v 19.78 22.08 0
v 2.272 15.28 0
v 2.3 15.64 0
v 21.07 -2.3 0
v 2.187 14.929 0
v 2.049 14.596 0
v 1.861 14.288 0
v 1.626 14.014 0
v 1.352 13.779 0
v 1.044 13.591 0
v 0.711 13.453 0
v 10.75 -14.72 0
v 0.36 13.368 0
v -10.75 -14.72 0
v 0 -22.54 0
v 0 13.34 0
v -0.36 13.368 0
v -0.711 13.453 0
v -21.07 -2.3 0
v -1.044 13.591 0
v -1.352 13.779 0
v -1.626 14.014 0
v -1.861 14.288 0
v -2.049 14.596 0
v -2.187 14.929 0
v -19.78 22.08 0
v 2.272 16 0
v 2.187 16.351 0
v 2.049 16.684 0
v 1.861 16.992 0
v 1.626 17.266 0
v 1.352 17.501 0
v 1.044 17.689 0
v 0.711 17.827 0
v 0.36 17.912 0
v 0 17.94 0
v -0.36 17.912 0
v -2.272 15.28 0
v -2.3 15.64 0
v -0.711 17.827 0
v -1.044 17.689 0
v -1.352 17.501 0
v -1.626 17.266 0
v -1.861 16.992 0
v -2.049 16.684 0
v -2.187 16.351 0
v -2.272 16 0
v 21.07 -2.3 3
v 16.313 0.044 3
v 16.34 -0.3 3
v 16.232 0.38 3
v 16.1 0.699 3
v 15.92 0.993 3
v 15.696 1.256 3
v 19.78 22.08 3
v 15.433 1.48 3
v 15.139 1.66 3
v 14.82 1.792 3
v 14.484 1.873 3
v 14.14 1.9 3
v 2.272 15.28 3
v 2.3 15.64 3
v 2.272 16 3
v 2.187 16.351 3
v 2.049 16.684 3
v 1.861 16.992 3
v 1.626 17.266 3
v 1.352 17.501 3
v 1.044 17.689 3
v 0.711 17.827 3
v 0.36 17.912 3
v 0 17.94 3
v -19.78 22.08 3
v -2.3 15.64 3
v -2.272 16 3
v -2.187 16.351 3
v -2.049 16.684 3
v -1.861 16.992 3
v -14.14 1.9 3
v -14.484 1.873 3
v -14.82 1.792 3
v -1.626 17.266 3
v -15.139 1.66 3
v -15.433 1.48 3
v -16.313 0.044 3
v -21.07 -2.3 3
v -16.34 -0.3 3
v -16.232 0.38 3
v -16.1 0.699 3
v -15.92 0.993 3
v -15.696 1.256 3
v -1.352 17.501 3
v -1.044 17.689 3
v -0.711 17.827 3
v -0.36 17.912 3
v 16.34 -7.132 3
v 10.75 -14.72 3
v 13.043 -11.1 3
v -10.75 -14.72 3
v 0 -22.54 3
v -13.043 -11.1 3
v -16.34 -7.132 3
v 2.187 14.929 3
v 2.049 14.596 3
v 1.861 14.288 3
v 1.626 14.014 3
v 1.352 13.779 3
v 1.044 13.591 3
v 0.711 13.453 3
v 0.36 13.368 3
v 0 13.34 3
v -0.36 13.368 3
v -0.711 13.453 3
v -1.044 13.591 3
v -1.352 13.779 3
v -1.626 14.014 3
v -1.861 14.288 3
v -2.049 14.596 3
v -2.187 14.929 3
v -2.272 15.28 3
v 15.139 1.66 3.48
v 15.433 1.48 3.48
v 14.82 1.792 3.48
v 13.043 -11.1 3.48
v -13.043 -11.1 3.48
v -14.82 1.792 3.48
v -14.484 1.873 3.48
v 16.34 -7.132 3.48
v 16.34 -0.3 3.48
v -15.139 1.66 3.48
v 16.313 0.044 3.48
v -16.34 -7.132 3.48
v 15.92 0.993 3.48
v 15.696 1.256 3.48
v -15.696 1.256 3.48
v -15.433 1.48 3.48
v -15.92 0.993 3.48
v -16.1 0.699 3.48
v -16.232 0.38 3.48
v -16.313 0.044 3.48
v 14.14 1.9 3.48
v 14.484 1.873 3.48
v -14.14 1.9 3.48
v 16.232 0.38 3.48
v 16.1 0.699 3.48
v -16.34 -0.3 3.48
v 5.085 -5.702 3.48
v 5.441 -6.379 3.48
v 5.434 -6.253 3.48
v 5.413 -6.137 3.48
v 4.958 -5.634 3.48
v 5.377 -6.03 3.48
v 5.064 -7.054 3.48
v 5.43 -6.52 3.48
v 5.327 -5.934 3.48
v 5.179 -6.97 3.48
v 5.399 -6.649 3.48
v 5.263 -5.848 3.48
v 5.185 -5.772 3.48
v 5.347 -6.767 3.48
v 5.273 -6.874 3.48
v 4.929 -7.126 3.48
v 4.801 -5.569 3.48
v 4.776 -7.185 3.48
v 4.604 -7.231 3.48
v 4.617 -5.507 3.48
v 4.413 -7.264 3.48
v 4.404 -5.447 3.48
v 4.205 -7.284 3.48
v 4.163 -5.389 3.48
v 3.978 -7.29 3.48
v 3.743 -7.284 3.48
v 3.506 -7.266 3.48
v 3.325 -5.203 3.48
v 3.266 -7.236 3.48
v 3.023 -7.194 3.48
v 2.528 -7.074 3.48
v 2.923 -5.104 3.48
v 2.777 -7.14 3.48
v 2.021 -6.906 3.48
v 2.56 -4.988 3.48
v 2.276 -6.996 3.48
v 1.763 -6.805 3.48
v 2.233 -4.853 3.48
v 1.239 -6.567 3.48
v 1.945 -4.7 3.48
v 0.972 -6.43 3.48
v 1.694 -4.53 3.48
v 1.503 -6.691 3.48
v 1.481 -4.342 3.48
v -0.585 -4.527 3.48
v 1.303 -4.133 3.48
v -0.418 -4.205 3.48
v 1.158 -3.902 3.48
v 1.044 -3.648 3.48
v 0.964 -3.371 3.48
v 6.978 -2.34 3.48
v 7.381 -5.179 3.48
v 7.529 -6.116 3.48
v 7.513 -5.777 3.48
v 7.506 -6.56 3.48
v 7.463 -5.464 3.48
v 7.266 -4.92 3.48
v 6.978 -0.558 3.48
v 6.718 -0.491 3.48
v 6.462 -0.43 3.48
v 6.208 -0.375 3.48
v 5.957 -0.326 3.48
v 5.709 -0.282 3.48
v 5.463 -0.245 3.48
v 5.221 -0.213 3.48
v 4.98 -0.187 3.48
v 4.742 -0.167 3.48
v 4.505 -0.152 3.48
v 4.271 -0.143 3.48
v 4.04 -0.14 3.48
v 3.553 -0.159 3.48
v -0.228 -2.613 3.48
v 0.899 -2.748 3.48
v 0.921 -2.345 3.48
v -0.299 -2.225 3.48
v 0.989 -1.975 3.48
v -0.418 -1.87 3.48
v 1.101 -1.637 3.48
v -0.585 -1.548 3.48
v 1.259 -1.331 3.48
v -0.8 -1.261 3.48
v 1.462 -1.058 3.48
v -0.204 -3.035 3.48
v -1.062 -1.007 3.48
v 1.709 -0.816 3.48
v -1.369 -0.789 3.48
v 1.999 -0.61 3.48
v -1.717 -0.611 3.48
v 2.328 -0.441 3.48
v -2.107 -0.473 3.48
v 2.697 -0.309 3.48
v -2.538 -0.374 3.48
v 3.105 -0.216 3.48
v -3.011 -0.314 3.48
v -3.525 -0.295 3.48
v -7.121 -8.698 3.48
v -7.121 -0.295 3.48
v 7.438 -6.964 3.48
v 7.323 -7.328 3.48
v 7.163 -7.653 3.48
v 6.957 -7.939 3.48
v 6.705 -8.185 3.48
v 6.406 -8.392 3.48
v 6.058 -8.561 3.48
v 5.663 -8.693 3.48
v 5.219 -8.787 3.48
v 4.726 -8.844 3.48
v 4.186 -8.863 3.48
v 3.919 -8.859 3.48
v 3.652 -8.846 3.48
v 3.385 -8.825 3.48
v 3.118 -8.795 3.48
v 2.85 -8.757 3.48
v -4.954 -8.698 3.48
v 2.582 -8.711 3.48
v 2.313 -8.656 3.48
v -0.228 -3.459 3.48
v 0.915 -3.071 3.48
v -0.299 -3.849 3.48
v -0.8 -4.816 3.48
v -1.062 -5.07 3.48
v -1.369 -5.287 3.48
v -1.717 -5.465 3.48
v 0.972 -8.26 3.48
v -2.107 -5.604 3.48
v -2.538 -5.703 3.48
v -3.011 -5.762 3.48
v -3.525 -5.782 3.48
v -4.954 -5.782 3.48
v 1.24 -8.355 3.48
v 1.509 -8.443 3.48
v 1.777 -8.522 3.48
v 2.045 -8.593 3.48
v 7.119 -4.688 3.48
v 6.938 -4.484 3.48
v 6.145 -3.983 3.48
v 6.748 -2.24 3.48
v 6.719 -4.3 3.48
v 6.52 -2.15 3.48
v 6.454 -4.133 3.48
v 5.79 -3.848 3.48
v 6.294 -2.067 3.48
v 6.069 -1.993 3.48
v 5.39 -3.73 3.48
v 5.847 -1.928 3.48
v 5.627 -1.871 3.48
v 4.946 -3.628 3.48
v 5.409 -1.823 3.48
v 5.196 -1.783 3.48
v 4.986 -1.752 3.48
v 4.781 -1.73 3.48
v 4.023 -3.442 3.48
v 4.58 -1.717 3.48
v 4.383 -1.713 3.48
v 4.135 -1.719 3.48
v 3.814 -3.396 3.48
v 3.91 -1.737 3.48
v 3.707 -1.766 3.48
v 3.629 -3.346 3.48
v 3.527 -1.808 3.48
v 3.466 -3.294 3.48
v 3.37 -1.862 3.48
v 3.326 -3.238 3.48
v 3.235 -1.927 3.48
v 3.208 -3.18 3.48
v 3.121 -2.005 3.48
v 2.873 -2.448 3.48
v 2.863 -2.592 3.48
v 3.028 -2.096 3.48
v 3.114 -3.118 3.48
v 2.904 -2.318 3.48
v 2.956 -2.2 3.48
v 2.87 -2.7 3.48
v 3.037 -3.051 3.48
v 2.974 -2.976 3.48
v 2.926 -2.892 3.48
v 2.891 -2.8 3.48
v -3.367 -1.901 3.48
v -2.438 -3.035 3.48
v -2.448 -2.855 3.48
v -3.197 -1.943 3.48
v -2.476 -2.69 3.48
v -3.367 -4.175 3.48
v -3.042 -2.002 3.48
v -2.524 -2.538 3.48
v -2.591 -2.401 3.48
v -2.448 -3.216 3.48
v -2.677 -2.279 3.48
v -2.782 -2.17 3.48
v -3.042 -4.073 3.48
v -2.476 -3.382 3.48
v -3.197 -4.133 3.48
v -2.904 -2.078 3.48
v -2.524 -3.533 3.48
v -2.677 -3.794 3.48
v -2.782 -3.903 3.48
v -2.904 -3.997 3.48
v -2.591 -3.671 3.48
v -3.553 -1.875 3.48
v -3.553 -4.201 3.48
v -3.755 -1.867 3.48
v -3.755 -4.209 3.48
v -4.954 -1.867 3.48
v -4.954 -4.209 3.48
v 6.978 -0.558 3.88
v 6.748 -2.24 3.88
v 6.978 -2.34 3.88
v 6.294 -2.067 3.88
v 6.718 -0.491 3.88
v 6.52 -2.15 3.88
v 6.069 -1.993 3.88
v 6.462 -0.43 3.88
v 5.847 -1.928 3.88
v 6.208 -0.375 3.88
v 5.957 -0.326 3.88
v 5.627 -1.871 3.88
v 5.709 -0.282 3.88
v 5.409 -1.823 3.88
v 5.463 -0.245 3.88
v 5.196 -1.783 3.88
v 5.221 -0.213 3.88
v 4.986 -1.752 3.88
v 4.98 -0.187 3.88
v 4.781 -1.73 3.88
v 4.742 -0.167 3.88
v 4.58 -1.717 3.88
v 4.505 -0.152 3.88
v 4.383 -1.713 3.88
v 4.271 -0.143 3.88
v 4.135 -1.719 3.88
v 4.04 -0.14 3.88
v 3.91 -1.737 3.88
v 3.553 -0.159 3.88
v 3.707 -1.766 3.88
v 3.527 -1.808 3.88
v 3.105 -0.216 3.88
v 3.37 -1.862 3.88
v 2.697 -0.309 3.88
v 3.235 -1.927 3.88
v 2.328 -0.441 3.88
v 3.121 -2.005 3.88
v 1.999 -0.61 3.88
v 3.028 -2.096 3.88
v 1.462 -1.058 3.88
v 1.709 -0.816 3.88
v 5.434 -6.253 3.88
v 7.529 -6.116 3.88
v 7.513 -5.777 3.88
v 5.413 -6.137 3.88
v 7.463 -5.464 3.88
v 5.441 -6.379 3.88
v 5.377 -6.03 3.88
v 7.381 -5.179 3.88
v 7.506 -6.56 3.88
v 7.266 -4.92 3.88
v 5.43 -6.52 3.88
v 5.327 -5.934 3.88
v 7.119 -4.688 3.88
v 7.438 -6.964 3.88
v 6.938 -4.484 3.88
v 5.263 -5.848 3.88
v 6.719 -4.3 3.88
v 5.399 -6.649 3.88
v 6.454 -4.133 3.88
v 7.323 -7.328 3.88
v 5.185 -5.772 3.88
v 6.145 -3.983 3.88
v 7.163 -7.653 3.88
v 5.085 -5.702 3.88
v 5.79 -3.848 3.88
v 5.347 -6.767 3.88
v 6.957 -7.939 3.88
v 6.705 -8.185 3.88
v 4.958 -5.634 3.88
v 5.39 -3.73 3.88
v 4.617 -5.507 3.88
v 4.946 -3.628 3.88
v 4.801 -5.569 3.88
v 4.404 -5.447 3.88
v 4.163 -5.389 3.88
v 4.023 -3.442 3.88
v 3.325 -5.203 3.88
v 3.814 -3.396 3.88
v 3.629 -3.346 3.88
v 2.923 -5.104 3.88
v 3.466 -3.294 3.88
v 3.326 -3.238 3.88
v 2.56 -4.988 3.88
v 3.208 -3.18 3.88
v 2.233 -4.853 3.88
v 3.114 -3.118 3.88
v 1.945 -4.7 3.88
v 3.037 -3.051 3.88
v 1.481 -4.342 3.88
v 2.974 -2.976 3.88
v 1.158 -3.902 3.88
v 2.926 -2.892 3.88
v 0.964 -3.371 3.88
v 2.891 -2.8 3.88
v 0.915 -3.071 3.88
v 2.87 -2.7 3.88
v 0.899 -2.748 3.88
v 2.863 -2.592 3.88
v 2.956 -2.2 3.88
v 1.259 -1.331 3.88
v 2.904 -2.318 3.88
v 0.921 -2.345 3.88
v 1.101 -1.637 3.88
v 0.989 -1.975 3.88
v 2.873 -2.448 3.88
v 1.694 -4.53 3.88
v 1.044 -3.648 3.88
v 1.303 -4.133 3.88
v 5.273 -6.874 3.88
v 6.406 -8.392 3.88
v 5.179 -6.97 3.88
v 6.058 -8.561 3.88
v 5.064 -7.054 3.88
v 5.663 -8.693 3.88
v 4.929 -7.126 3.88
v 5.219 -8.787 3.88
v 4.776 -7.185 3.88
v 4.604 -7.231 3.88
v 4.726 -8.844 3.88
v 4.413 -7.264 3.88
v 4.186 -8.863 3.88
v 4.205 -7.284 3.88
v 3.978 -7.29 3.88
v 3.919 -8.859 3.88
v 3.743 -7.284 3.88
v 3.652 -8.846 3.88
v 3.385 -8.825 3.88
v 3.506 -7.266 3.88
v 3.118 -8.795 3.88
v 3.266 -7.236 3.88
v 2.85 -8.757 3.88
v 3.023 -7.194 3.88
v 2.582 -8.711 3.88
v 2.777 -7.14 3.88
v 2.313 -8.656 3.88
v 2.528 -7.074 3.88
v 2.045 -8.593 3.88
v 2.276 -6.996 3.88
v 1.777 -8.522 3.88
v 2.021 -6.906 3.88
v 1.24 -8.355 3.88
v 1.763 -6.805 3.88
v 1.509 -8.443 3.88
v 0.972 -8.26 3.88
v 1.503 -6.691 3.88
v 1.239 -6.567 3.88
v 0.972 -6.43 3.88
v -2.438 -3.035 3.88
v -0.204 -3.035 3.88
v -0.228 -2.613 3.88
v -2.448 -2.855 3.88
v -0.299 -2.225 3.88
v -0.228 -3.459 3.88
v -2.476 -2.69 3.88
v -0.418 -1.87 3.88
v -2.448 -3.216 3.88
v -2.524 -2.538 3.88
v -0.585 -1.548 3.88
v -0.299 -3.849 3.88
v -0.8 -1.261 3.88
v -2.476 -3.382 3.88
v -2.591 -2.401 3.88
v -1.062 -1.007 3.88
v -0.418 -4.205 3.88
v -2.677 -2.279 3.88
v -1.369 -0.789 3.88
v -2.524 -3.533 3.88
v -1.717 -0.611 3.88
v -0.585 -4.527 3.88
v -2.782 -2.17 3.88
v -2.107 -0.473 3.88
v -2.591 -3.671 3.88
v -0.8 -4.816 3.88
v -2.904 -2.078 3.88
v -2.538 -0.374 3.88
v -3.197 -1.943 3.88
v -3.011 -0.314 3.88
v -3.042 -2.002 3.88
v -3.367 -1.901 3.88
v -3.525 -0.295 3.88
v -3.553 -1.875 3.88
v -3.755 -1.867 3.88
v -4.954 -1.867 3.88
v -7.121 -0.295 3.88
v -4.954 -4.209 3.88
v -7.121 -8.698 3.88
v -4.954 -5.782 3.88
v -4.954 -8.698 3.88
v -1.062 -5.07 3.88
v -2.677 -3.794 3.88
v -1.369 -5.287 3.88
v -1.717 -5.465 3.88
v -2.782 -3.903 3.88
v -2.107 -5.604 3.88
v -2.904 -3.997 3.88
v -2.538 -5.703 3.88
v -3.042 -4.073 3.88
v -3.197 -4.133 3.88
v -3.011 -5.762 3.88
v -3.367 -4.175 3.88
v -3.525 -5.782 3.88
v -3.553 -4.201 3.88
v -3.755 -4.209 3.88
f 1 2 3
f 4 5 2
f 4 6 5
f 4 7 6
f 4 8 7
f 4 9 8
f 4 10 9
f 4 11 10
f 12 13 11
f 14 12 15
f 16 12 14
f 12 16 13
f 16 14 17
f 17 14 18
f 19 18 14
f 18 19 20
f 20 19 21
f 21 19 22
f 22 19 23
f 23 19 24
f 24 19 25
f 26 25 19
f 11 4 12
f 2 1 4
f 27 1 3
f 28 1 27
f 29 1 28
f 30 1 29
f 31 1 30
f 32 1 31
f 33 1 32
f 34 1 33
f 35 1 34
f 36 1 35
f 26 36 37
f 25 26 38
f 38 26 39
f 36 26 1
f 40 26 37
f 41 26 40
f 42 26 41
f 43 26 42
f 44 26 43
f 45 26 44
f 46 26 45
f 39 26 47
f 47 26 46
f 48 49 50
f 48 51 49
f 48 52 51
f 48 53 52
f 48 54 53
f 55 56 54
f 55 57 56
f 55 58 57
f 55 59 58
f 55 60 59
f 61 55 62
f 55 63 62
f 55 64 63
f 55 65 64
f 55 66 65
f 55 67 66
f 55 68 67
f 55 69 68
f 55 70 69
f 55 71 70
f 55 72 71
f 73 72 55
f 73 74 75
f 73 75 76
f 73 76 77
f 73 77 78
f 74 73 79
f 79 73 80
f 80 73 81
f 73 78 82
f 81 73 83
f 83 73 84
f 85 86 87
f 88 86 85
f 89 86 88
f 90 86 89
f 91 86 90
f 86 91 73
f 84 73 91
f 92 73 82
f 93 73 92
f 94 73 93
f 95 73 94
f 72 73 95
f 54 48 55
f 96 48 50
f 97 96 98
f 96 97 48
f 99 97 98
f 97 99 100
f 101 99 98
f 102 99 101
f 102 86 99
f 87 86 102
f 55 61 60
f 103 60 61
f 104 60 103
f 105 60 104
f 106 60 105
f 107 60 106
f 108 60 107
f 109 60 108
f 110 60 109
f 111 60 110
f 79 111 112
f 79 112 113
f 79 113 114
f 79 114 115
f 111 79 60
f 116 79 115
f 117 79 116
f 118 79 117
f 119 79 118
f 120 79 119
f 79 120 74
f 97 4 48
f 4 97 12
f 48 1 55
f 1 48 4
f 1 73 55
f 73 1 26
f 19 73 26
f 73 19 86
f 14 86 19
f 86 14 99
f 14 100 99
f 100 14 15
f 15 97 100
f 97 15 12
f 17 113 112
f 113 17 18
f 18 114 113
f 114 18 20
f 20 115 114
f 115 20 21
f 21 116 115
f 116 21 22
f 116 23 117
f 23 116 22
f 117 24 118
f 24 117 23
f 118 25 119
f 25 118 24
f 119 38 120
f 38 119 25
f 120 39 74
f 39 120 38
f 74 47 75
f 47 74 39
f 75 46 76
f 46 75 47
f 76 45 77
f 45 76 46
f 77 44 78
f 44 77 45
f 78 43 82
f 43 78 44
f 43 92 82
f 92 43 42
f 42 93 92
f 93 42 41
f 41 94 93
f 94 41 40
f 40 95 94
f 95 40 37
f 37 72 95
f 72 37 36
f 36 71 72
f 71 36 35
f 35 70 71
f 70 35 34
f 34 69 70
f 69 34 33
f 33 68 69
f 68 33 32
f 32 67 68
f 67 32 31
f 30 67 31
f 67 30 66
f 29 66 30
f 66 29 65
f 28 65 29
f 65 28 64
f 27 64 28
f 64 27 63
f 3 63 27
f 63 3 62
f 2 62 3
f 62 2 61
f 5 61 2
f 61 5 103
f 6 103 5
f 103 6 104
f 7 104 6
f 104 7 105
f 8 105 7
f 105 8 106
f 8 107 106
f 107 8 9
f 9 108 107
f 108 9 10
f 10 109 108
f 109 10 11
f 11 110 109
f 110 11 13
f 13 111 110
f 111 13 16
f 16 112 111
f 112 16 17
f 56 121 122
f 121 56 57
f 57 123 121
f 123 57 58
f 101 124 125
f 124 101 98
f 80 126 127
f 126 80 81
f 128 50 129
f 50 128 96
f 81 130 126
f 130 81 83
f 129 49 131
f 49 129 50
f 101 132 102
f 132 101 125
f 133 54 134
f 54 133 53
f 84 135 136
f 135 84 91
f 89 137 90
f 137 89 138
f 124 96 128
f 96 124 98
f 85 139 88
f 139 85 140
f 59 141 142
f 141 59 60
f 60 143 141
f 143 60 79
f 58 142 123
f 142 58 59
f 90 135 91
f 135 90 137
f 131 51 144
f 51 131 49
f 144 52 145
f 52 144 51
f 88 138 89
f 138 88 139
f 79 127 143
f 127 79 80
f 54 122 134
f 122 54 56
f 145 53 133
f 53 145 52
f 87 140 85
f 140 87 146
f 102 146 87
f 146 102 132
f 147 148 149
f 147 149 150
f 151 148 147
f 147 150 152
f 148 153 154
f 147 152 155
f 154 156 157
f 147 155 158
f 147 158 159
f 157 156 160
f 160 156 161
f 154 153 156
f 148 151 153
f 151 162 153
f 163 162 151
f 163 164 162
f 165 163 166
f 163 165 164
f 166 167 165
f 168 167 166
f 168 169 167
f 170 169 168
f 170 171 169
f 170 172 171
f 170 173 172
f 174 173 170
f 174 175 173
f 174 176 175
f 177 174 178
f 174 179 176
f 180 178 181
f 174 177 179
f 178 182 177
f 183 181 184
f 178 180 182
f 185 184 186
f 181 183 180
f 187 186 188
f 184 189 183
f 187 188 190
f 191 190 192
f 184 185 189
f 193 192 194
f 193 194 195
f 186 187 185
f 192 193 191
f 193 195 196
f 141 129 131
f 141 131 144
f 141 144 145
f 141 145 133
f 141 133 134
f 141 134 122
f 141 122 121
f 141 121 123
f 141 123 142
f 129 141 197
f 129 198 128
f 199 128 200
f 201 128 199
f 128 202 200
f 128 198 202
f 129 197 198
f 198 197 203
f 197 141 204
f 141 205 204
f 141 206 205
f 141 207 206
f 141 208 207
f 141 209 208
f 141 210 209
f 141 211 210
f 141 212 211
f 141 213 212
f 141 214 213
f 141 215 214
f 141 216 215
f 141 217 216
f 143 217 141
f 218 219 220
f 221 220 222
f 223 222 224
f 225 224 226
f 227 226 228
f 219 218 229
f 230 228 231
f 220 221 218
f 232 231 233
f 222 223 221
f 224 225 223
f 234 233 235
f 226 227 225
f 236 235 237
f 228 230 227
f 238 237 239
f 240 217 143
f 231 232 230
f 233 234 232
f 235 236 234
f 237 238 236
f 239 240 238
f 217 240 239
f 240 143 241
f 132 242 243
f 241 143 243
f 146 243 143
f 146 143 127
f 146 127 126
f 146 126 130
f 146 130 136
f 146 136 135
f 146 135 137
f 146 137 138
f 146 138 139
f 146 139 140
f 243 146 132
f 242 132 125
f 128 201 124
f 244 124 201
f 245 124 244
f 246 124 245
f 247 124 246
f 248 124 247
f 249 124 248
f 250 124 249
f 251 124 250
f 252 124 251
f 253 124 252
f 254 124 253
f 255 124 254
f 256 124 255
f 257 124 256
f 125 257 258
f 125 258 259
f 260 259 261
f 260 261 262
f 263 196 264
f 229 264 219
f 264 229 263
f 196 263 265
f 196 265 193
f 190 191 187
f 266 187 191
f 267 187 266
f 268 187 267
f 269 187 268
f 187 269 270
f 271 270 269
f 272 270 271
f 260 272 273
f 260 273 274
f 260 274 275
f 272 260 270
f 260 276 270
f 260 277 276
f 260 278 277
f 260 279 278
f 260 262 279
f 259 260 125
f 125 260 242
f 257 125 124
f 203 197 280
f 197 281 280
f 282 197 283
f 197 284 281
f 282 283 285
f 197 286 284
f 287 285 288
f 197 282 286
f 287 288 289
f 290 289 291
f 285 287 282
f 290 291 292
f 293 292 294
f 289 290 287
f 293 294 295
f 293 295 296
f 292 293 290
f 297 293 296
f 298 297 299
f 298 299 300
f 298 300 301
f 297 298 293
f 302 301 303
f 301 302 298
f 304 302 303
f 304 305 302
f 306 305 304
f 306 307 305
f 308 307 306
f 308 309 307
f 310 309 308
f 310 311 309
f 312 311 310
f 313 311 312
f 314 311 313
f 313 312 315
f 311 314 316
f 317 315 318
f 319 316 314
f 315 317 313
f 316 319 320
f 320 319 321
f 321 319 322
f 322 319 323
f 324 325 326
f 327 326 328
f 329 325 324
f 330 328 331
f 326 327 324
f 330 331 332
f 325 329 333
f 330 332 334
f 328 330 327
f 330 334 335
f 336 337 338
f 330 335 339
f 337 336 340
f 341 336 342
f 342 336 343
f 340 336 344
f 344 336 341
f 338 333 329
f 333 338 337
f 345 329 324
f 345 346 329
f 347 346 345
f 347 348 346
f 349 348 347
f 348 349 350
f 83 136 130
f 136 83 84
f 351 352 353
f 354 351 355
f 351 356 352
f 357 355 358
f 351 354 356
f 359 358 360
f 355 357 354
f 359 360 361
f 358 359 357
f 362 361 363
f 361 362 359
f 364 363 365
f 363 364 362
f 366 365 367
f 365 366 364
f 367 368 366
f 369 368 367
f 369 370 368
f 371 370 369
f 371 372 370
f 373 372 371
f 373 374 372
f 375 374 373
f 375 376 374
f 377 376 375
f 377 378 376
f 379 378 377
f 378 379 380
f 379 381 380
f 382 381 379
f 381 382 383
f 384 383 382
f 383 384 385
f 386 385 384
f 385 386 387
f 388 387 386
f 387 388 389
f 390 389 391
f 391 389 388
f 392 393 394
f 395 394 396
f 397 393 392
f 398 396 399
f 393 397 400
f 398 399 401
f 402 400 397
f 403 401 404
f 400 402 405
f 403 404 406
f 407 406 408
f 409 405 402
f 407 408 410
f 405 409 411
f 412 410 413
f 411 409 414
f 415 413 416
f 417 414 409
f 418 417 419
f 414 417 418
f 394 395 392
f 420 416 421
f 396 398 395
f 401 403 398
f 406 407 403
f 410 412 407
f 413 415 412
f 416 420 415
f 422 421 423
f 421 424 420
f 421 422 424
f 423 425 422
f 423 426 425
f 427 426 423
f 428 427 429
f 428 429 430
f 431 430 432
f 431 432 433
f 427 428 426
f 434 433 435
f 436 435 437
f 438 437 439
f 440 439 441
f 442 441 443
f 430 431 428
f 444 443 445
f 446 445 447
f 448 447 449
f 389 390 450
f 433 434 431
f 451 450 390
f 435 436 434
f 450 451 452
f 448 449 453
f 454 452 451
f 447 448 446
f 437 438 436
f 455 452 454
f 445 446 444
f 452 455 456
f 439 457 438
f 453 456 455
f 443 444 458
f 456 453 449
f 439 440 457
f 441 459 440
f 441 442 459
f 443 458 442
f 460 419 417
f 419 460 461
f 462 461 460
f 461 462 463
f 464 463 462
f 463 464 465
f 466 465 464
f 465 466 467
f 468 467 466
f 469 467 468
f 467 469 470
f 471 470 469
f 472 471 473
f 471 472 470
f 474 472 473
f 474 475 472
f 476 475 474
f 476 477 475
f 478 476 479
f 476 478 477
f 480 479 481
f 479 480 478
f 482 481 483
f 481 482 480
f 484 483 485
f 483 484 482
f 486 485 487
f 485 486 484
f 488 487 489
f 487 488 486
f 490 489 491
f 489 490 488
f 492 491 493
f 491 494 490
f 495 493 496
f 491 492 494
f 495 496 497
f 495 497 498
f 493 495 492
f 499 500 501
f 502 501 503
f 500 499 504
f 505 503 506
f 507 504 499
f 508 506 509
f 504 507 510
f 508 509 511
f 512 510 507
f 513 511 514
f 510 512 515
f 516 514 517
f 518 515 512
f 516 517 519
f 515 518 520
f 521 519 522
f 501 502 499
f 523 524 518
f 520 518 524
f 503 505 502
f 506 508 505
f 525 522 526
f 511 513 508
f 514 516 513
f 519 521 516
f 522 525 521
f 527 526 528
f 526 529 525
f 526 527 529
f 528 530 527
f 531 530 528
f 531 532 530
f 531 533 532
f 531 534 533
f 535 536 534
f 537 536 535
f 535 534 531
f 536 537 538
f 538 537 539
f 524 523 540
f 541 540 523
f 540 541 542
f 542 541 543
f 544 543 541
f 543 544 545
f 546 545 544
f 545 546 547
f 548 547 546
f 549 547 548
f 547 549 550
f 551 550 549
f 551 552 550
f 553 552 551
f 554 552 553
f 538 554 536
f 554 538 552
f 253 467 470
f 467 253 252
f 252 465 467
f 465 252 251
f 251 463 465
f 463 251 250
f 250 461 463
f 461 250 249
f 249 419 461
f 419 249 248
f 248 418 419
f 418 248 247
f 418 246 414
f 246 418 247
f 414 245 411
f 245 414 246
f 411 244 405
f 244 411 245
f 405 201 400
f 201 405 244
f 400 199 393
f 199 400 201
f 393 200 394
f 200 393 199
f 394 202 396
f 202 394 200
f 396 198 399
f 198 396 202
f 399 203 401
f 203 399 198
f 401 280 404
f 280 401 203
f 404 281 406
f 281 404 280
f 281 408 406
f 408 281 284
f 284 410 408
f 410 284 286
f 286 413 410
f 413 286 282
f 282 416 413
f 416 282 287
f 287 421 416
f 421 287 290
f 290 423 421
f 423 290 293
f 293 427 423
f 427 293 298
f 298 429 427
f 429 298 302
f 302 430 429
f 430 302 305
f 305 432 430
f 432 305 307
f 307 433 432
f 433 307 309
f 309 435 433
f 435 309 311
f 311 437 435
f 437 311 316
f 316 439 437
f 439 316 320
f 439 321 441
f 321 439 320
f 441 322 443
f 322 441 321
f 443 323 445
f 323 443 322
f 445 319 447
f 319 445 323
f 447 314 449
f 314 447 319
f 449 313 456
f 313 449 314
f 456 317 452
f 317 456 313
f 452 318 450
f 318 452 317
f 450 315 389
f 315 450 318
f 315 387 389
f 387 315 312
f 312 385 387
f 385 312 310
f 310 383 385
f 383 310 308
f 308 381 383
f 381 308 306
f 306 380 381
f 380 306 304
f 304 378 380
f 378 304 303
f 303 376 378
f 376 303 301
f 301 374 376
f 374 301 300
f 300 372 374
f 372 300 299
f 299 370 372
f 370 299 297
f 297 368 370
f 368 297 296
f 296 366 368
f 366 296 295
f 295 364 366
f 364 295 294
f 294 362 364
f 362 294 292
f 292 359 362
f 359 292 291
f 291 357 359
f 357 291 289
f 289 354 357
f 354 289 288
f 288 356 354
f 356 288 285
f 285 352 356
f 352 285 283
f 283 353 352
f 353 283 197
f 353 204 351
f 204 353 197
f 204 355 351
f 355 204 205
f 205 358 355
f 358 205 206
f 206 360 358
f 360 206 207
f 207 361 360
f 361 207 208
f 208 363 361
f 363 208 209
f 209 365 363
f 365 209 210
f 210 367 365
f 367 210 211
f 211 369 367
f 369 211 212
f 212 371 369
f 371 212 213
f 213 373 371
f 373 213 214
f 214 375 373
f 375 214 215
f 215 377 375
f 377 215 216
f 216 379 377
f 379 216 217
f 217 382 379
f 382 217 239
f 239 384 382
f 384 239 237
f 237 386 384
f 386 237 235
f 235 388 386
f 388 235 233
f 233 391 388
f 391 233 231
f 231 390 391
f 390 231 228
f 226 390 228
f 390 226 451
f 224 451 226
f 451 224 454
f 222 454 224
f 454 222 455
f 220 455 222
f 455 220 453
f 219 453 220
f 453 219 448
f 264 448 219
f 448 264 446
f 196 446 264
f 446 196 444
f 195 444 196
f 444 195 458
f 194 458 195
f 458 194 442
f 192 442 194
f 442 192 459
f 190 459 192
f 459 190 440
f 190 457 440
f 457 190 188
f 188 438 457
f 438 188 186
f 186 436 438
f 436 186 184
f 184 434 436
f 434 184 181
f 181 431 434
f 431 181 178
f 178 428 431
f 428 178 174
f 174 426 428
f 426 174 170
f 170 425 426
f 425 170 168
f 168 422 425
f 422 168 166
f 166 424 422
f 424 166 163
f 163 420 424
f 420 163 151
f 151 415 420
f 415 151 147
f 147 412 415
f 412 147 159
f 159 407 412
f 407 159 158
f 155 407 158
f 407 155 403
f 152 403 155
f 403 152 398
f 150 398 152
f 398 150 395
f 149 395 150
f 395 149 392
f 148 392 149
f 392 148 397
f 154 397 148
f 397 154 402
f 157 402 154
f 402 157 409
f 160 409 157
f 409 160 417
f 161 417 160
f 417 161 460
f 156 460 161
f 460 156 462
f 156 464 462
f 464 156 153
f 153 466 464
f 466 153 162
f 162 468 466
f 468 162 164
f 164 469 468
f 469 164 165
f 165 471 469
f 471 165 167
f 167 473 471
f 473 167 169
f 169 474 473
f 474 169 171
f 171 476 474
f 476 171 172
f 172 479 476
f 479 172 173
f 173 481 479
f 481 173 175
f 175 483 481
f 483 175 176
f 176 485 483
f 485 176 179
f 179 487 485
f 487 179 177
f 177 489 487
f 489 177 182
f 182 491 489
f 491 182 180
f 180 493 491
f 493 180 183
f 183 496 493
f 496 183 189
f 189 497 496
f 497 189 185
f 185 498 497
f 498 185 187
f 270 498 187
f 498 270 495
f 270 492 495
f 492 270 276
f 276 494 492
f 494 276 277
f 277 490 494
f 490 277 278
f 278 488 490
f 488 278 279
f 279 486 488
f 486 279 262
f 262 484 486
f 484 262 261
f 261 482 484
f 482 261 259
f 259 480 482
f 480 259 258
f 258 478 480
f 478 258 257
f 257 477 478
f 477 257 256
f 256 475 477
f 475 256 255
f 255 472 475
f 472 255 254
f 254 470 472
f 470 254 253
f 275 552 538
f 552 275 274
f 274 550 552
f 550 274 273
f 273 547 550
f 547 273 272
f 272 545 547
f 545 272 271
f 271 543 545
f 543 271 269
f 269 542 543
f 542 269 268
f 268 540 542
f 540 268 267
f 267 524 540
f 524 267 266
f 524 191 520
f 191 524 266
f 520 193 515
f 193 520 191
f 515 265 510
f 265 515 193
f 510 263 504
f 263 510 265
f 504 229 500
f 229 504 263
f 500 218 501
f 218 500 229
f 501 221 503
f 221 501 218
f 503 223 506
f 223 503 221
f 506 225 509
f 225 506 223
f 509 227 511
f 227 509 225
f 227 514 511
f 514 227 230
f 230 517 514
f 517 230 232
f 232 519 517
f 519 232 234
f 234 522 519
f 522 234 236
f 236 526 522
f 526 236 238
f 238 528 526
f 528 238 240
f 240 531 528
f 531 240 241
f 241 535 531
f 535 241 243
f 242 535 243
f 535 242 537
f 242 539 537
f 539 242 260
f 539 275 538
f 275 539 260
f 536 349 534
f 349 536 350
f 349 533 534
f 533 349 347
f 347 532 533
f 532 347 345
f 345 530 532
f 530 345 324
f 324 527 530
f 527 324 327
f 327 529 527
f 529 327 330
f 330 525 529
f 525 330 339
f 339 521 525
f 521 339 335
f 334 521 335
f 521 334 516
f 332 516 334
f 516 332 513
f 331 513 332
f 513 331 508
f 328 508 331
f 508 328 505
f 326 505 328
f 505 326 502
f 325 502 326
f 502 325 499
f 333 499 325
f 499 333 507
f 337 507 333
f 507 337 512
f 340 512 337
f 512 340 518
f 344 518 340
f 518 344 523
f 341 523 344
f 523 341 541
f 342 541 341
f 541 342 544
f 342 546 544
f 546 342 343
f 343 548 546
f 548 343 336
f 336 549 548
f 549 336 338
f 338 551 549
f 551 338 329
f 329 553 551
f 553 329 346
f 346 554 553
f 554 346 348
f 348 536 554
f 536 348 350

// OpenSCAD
// POLSOLIDE — Brelok „Tarcza”
// Materiały: base=czarny (#18181B); red=czerwony (#B7131C); white=biały (#F1F0EC).
// Zapisz do STL: openscad -o element.stl -D 'part="base"' tenplik.scad
// Model na płasko: wszystkie barwy zmieniają się tylko na samym końcu druku.
$fn=40;
part="all"; // all, base, red, white
W=43; H=46; T=3.0; kind="shield";
RH=0.48; WH=0.40; // wysokość czerwonego i białego detalowania
magnet=false;
label=""; // zmień np. numer lokalu, oznaczenie stanowiska lub pomieszczenia

module rr(w,h,r){offset(r=r) square([max(0.1,w-2*r),max(0.1,h-2*r)],center=true);}
module outline(){
 if(kind=="house")polygon(points=[[-W/2,-H/2],[W/2,-H/2],[W/2,H*.13],[0,H/2],[-W/2,H*.13]]);
 else if(kind=="shield")polygon(points=[[-W*.46,H*.48],[W*.46,H*.48],[W*.49,-H*.05],[W*.25,-H*.32],[0,-H*.49],[-W*.25,-H*.32],[-W*.49,-H*.05]]);
 else if(kind=="hex")polygon(points=[[-W*.35,-H/2],[W*.35,-H/2],[W/2,0],[W*.35,H/2],[-W*.35,H/2],[-W/2,0]]);
 else if(kind=="oval")scale([W/2,H/2])circle(r=1,$fn=60);
 else if(kind=="coin")circle(d=W,$fn=72);
 else if(kind=="plaque")rr(W,H,3.0);
 else if(kind=="luggage")rr(W,H,6.5);
 else if(kind=="arch")union(){translate([0,-H*.10])rr(W,H*.8,5);translate([0,H*.14])scale([W/2,H*.37])circle(r=1,$fn=48);}
 else if(kind=="key") union(){translate([-W*.3,0])circle(d=H,$fn=48);translate([W*.08,-H*.16])square([W*.68,H*.32],center=true);translate([W*.31,-H*.27])square([W*.11,H*.20],center=true);translate([W*.42,-H*.27])square([W*.09,H*.20],center=true);}
 else if(kind=="tag")union(){rr(W-7,H,5);translate([-W/2+5,0])circle(d=H*.78,$fn=48);}
 else rr(W,H,5);
}
module hole2d(){
 if(kind=="house")translate([0,H*.29])circle(d=4.6,$fn=40);
 else if(kind=="shield")translate([0,H*.34])circle(d=4.6,$fn=40);
 else if(kind=="key")translate([-W*.3,0])circle(d=4.6,$fn=40);
 else if(kind=="oval" && !magnet)translate([-W*.34,0])circle(d=4.6,$fn=40);
 else if(kind=="tag")translate([-W*.36,0])circle(d=4.6,$fn=40);
 else if(kind=="luggage")translate([-W*.40,0])circle(d=5,$fn=40);
}
module footprint(){difference(){outline(); if(!magnet)hole2d();}}
// W małych produktach monogram PS jest większy i czytelniejszy przy dyszy 0.4 mm.
small=(W<=50 || kind=="coin" || kind=="hex");
bw= min(W*.76,64);
bh=(label=="")?(small?13:15):20;
// dla breloka w kształcie klucza środek znaku przesunięto od oczka
badgeX=(kind=="key")?W*.13:(kind=="oval"&&!magnet?W*.055:(kind=="tag"?W*.07:(kind=="luggage"?W*.03:0)));
badgeY=(kind=="house" || kind=="shield")?-H*.10:0;
module brand_patch(){translate([badgeX,badgeY])rr(bw,bh,2.2);}
module base_black(){difference(){linear_extrude(height=T,convexity=8)footprint();
 if(magnet)translate([0,0,-0.02])cylinder(h=2.14,d=10.35,$fn=48);
}}
module red_cap(){translate([0,0,T])linear_extrude(height=RH)intersection(){offset(delta=-.55)footprint();brand_patch();}}
module white_brand(){
 translate([badgeX,badgeY,T+RH])linear_extrude(height=WH)
 if(label!="") {
   translate([0,3.8])text("POLSOLIDE",font="DejaVu Sans:style=Bold",size=min(4.0,bw*.087),halign="center",valign="center");
   translate([0,-4.0])text(label,font="DejaVu Sans:style=Bold",size=min(6.4,bw/(max(2,len(label))*0.75)),halign="center",valign="center");
 }
 else if(small) text("PS",font="DejaVu Sans:style=Bold",size=8.3,halign="center",valign="center");
 else text("POLSOLIDE",font="DejaVu Sans:style=Bold",size=min(6.4,bw*.127),halign="center",valign="center");
}
if(part=="all"||part=="base")color([.094,.094,.106])base_black();
if(part=="all"||part=="red")color([.718,.075,.11])red_cap();
if(part=="all"||part=="white")color([.945,.941,.925])white_brand();
